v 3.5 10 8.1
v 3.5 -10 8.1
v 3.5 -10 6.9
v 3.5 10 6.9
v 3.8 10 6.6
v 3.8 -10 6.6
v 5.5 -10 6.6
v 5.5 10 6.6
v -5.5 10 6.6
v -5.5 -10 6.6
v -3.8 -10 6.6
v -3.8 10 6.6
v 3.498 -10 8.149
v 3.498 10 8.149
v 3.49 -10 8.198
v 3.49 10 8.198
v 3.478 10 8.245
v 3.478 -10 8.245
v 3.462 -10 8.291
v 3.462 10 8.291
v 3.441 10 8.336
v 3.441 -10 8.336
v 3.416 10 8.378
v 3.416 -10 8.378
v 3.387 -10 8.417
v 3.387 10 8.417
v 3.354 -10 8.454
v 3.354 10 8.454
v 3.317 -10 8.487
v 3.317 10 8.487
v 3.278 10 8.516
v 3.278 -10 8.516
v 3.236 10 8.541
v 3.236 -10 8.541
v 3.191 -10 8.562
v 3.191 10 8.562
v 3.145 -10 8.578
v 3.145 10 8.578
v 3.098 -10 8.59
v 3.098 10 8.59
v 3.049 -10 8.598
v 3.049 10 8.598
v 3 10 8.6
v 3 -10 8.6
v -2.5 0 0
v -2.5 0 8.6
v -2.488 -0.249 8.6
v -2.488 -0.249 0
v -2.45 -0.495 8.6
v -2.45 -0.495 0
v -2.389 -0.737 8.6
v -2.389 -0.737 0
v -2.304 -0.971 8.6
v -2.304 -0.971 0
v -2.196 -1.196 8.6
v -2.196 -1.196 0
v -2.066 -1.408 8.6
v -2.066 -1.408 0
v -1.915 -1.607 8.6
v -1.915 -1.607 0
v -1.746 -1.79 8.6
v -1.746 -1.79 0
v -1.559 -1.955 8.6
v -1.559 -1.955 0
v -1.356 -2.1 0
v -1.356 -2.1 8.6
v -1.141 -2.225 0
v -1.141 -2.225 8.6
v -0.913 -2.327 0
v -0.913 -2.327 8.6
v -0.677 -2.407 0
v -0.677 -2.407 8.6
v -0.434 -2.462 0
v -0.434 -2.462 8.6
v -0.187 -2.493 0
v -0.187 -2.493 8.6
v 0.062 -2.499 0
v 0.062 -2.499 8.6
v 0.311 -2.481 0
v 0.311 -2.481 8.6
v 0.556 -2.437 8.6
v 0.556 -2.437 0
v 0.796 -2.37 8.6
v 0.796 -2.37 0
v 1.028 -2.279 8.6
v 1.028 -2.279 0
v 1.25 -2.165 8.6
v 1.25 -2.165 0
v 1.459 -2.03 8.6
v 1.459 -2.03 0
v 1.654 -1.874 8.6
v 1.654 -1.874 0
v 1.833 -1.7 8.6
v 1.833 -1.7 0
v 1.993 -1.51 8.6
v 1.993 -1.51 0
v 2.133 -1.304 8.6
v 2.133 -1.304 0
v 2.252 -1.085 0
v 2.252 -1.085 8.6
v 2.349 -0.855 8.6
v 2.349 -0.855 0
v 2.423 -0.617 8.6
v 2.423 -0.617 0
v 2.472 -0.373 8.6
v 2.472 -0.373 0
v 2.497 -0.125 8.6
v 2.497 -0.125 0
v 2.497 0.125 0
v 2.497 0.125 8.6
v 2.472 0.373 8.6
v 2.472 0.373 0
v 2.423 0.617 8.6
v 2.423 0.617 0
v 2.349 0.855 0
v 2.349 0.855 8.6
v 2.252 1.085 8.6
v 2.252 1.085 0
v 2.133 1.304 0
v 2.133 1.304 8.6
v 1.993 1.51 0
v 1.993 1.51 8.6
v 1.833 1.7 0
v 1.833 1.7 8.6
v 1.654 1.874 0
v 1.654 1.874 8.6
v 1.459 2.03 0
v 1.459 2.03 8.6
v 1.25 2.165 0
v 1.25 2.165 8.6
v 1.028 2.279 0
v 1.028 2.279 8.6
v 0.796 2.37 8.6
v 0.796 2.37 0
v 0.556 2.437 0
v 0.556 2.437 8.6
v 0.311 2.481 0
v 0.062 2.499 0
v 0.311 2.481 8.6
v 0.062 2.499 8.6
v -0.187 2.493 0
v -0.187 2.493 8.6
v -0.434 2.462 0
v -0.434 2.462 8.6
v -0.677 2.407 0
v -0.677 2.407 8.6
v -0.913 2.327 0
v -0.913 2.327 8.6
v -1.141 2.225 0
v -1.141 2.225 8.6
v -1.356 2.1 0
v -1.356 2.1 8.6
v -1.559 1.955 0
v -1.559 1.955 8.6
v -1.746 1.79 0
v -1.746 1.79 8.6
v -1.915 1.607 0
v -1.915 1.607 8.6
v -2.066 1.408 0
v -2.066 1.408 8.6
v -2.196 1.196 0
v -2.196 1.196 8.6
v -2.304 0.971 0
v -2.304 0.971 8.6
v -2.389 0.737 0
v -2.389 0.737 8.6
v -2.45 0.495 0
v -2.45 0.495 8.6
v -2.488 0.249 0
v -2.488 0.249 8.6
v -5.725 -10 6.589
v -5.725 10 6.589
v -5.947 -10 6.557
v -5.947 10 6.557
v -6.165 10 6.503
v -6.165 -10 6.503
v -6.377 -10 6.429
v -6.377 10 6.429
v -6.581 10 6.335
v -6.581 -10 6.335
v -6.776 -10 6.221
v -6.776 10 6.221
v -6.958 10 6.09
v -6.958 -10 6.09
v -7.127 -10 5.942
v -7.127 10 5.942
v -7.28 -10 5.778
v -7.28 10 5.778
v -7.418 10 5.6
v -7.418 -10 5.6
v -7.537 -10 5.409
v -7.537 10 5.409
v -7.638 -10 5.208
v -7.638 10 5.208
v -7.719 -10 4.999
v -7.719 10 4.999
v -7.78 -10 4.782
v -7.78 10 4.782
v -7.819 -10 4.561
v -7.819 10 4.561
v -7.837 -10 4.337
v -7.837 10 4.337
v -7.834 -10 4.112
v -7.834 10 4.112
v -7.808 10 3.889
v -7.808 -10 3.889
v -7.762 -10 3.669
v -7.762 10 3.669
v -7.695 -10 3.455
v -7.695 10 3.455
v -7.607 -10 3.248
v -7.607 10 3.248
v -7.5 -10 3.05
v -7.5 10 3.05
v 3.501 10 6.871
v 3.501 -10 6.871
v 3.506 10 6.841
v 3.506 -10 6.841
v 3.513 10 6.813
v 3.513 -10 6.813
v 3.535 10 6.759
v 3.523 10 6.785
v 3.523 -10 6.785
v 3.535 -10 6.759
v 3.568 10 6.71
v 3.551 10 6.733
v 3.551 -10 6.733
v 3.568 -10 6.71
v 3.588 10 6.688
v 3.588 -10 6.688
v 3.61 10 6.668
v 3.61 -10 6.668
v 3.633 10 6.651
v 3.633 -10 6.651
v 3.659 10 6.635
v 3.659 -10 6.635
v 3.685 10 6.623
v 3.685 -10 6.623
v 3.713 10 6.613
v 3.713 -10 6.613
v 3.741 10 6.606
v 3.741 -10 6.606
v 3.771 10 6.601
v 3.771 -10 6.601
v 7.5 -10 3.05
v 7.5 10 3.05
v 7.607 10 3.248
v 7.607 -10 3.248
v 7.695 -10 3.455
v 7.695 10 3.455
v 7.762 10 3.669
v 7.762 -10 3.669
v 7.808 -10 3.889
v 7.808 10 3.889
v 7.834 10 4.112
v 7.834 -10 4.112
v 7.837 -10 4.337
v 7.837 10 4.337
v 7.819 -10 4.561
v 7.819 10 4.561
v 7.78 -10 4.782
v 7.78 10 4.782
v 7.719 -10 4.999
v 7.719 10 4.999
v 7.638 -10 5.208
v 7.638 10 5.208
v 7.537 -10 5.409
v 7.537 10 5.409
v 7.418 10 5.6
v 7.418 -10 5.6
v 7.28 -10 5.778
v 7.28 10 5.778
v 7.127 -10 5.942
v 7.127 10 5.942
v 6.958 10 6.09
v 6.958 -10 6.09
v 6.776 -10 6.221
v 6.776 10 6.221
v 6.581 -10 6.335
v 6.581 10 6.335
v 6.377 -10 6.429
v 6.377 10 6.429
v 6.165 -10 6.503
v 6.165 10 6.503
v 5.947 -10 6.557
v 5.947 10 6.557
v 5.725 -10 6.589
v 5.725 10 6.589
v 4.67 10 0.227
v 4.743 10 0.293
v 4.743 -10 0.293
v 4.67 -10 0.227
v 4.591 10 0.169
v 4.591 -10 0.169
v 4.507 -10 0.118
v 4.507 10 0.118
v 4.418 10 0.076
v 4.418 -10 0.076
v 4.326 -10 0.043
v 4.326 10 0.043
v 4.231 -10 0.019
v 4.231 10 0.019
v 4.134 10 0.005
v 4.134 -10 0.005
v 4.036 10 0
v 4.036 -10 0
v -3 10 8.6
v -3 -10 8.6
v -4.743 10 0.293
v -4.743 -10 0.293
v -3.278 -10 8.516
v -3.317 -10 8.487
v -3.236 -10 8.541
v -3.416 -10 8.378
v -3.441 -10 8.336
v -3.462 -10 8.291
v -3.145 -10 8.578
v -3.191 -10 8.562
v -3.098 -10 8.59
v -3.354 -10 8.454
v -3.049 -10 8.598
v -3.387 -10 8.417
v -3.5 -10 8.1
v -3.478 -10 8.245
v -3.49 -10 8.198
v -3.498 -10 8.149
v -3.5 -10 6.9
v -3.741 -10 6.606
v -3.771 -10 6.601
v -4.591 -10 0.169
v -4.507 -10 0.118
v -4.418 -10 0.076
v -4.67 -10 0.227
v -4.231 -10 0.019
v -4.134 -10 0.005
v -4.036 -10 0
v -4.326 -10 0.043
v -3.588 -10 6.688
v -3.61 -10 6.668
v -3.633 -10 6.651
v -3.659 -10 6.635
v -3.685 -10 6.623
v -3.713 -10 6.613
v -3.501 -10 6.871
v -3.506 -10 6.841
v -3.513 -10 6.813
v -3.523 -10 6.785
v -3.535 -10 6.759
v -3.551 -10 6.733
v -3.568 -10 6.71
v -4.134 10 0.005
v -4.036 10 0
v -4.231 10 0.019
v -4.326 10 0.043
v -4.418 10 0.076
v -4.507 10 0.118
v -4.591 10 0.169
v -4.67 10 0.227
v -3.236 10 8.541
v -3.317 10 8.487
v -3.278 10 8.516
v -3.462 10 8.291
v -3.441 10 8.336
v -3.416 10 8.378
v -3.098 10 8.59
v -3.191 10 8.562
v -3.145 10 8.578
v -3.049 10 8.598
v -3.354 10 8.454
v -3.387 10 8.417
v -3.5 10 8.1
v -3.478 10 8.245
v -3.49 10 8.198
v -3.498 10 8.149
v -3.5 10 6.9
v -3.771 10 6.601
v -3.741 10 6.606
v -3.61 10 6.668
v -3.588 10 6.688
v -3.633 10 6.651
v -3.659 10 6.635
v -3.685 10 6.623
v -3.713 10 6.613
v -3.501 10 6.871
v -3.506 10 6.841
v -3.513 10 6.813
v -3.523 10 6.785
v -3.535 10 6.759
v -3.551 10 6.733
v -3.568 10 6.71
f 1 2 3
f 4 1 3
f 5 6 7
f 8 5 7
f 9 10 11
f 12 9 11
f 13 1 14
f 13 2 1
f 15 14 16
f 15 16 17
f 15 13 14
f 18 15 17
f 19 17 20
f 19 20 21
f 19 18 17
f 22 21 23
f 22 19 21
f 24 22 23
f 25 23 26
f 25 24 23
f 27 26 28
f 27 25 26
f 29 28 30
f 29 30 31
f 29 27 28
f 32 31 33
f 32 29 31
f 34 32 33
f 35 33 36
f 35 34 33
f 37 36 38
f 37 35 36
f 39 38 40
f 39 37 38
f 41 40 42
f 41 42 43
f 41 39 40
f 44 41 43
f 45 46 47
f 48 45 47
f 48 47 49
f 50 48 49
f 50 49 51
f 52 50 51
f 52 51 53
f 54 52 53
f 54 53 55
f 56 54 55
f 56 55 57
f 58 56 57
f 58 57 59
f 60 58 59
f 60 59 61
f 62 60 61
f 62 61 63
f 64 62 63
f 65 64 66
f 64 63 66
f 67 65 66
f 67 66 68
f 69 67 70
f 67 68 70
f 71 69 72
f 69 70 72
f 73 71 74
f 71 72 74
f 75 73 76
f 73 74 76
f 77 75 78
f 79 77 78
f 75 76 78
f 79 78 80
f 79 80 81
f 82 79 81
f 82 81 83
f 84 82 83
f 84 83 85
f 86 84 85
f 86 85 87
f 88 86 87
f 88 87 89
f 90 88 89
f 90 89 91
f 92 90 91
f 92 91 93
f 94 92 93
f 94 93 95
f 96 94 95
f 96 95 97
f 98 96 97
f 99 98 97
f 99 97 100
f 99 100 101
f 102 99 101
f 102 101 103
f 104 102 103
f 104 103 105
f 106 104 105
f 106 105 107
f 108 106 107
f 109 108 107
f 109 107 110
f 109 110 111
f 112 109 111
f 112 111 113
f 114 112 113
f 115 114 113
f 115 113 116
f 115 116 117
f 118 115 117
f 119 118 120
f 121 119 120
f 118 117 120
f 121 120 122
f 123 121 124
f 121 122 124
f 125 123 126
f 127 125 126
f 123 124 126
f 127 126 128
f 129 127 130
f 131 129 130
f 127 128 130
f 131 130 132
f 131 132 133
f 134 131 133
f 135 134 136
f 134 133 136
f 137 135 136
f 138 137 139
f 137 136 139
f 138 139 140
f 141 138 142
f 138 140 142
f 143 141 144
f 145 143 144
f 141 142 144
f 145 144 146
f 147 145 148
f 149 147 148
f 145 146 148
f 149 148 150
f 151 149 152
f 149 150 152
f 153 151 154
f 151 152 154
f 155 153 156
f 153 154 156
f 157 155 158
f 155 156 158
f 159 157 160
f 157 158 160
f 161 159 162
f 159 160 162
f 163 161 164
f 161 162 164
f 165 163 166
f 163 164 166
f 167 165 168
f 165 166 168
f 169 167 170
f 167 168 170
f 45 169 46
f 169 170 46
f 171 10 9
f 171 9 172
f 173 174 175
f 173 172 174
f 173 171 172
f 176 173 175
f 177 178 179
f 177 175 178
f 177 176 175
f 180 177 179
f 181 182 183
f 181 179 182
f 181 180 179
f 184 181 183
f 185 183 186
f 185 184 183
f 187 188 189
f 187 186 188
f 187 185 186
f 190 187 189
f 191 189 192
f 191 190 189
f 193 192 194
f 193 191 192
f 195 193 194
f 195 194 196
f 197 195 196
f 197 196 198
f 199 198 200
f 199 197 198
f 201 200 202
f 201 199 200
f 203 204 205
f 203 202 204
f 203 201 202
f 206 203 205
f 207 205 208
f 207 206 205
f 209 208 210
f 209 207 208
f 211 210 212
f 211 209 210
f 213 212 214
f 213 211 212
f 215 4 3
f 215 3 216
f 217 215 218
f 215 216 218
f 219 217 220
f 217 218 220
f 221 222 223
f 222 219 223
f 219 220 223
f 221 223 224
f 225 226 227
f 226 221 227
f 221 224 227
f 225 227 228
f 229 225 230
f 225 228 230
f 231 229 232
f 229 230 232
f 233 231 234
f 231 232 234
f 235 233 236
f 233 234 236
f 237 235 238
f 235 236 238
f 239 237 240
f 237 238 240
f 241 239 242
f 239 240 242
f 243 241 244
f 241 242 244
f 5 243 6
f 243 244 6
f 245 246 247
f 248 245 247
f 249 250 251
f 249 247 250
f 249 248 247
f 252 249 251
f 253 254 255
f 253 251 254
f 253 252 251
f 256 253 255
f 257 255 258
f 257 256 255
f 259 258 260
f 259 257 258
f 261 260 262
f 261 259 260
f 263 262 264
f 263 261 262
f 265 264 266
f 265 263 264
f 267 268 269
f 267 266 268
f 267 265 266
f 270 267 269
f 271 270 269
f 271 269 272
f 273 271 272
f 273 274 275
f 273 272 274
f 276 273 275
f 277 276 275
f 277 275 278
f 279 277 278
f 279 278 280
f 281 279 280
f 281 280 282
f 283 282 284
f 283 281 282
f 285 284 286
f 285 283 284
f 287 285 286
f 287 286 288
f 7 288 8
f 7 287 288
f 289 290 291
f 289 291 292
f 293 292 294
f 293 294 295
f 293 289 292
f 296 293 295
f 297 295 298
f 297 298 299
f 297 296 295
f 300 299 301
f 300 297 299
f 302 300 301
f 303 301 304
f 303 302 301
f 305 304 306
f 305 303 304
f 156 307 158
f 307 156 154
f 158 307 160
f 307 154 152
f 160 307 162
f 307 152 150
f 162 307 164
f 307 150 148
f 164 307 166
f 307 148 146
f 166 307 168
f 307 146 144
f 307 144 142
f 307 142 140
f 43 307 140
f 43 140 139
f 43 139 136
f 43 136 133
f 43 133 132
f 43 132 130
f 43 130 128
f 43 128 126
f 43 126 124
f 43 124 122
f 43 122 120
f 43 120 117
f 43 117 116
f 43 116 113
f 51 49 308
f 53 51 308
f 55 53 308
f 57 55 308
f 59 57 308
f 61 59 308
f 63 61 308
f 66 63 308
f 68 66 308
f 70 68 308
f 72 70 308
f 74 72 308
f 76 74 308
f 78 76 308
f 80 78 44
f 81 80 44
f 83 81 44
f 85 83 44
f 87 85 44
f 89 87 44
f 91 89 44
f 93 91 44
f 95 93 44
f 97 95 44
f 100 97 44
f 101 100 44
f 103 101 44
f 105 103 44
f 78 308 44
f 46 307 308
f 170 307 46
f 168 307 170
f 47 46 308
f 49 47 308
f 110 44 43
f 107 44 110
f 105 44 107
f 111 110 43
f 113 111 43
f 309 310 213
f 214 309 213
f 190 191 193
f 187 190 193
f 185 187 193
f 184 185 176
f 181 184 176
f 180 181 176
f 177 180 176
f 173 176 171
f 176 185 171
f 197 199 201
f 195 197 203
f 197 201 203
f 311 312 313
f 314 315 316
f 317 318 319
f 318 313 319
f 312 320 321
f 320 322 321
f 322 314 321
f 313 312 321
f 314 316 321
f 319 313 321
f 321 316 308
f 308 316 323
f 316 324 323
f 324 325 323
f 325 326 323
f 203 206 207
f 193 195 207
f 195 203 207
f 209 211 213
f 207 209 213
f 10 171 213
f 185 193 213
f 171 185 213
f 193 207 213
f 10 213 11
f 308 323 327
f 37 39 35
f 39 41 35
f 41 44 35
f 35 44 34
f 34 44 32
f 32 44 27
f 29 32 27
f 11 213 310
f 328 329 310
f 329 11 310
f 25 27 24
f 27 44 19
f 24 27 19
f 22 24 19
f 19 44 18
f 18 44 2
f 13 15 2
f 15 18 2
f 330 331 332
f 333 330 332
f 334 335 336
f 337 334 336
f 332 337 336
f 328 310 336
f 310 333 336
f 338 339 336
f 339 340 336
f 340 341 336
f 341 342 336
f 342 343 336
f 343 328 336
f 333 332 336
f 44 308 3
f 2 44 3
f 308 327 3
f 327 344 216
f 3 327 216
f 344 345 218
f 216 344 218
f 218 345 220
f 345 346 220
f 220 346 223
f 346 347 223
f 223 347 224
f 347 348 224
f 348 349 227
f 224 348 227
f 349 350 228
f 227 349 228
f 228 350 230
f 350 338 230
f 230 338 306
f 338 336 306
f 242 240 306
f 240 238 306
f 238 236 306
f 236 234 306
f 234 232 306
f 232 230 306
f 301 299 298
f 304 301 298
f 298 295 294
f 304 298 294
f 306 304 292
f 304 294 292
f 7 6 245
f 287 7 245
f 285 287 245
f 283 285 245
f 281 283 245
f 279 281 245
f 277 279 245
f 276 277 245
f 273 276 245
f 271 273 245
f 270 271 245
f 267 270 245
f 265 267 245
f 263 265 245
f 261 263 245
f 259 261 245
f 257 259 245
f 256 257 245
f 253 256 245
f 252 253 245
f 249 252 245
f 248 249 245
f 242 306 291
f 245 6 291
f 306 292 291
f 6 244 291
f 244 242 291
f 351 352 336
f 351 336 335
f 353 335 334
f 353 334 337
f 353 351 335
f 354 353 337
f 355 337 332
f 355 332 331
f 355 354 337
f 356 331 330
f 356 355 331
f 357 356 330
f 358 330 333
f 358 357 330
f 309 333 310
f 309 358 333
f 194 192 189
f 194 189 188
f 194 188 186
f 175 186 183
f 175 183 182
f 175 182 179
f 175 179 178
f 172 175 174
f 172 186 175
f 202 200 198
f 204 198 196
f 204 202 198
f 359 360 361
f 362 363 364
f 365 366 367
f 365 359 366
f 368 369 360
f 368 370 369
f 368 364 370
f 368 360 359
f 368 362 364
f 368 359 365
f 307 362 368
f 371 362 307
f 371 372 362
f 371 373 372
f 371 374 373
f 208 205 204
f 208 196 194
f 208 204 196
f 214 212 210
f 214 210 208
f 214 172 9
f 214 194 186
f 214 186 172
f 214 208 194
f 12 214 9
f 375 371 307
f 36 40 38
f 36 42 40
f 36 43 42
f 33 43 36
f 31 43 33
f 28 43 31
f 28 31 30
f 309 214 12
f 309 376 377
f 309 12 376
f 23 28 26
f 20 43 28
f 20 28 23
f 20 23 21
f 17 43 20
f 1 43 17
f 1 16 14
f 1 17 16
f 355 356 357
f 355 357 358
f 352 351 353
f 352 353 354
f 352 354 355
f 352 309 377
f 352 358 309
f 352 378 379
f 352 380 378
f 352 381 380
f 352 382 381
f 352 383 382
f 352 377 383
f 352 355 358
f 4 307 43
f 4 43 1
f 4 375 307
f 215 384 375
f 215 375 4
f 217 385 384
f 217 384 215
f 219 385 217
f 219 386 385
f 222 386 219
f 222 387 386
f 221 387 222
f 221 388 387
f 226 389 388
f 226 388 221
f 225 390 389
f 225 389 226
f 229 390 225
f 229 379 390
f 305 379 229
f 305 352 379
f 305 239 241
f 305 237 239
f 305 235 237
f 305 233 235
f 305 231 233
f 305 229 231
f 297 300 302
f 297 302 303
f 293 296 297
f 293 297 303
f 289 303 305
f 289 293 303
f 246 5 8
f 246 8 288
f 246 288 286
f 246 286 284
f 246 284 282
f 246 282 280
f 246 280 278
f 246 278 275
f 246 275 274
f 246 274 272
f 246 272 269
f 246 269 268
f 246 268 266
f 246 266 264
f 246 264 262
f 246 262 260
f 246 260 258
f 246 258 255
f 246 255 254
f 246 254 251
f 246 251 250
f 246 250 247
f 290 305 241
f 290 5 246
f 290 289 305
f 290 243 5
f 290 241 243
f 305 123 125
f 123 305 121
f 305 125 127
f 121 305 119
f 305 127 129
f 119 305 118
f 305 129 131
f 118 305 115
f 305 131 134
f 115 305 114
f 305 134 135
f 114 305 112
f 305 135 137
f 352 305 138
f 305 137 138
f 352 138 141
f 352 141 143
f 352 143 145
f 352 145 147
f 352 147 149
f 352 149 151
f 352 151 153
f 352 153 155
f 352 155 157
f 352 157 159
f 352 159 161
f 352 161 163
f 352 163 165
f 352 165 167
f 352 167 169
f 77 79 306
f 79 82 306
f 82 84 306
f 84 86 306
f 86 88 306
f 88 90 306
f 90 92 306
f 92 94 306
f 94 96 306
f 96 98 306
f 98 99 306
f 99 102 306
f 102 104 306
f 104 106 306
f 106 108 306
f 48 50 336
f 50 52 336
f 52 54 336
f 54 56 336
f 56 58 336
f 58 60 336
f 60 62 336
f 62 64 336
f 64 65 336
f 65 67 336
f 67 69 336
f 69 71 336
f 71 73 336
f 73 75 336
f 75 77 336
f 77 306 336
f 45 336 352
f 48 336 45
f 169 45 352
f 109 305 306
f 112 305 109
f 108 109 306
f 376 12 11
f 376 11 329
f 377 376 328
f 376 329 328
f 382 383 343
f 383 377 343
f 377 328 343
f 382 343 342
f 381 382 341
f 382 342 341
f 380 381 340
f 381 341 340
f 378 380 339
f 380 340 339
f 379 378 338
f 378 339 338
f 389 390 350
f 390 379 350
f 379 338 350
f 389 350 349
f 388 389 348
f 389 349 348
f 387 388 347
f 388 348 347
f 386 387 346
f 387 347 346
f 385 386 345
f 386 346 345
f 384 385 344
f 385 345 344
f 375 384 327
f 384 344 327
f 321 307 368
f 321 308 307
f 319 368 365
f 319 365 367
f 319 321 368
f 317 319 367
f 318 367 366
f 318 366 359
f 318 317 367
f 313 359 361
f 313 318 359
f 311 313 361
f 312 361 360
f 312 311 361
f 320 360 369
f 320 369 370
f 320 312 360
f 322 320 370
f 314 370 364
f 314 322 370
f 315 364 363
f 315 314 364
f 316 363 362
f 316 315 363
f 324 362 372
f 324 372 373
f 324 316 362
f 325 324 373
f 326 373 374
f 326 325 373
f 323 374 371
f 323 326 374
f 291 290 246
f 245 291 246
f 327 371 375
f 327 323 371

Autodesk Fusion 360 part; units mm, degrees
sketch "Sketch1" plane through (0, 0, 0) normal (0, 1, 0) x (1, 0, 0)
  line L0 (4.45, 0) -> (-4.45, 0)
  line L1 (-3.5, -8.6) -> (3.5, -8.6)
  line L2 (3.5, -8.6) -> (3.5, -6.6)
  line L3 (-3.5, -8.6) -> (-3.5, -6.6)
  line L4 (4.45, 0) -> (7.5, -3.05)
  line L5 (-4.45, 0) -> (-7.5, -3.05)
  line L6 (-4.45, 0) -> (-0.1366, 0) construction
  arc A0 (5.5, -6.6) -> (7.5, -3.05) centre (5.5, -4.2616) ccw
  arc A1 (-7.5, -3.05) -> (-5.5, -6.6) centre (-5.5, -4.2616) ccw
  line L7 (-5.5, -6.6) -> (-3.5, -6.6)
  line L8 (3.5, -6.6) -> (5.5, -6.6)
  dimension "d2" = 8.9
  dimension "d3" = 2
  dimension "d4" = 7
  dimension "d8" = 135
extrude "Extrude3" add sketch "Sketch1" along normal mid plane 20
sketch "Sketch2" plane through (0, 0, 8.6) normal (0, 0, 1) x (-1, 0, 0)
  line L0 (-3.5, 10) -> (-3.5, -10)
  line L1 (-3.5, -10) -> (3.5, -10)
  line L2 (3.5, -10) -> (3.5, 10)
  line L3 (3.5, 10) -> (-3.5, 10)
  circle A0 centre (0, 0) radius 2.5
  dimension "d22" = 5
extrude "Extrude4" cut sketch "Sketch2" against normal blind 8.8 contours A0
thread "Thread2"
fillet "Fillet4" radius 1 2 edges at (4.45, 0, 0) (-4.45, 0, 0)
fillet "Fillet5" radius 0.3 2 edges at (3.5, 0, 6.6) (-3.5, 0, 6.6)
fillet "Fillet6" radius 0.5 2 edges at (-3.5, 0, 8.6) (3.5, 0, 8.6)
